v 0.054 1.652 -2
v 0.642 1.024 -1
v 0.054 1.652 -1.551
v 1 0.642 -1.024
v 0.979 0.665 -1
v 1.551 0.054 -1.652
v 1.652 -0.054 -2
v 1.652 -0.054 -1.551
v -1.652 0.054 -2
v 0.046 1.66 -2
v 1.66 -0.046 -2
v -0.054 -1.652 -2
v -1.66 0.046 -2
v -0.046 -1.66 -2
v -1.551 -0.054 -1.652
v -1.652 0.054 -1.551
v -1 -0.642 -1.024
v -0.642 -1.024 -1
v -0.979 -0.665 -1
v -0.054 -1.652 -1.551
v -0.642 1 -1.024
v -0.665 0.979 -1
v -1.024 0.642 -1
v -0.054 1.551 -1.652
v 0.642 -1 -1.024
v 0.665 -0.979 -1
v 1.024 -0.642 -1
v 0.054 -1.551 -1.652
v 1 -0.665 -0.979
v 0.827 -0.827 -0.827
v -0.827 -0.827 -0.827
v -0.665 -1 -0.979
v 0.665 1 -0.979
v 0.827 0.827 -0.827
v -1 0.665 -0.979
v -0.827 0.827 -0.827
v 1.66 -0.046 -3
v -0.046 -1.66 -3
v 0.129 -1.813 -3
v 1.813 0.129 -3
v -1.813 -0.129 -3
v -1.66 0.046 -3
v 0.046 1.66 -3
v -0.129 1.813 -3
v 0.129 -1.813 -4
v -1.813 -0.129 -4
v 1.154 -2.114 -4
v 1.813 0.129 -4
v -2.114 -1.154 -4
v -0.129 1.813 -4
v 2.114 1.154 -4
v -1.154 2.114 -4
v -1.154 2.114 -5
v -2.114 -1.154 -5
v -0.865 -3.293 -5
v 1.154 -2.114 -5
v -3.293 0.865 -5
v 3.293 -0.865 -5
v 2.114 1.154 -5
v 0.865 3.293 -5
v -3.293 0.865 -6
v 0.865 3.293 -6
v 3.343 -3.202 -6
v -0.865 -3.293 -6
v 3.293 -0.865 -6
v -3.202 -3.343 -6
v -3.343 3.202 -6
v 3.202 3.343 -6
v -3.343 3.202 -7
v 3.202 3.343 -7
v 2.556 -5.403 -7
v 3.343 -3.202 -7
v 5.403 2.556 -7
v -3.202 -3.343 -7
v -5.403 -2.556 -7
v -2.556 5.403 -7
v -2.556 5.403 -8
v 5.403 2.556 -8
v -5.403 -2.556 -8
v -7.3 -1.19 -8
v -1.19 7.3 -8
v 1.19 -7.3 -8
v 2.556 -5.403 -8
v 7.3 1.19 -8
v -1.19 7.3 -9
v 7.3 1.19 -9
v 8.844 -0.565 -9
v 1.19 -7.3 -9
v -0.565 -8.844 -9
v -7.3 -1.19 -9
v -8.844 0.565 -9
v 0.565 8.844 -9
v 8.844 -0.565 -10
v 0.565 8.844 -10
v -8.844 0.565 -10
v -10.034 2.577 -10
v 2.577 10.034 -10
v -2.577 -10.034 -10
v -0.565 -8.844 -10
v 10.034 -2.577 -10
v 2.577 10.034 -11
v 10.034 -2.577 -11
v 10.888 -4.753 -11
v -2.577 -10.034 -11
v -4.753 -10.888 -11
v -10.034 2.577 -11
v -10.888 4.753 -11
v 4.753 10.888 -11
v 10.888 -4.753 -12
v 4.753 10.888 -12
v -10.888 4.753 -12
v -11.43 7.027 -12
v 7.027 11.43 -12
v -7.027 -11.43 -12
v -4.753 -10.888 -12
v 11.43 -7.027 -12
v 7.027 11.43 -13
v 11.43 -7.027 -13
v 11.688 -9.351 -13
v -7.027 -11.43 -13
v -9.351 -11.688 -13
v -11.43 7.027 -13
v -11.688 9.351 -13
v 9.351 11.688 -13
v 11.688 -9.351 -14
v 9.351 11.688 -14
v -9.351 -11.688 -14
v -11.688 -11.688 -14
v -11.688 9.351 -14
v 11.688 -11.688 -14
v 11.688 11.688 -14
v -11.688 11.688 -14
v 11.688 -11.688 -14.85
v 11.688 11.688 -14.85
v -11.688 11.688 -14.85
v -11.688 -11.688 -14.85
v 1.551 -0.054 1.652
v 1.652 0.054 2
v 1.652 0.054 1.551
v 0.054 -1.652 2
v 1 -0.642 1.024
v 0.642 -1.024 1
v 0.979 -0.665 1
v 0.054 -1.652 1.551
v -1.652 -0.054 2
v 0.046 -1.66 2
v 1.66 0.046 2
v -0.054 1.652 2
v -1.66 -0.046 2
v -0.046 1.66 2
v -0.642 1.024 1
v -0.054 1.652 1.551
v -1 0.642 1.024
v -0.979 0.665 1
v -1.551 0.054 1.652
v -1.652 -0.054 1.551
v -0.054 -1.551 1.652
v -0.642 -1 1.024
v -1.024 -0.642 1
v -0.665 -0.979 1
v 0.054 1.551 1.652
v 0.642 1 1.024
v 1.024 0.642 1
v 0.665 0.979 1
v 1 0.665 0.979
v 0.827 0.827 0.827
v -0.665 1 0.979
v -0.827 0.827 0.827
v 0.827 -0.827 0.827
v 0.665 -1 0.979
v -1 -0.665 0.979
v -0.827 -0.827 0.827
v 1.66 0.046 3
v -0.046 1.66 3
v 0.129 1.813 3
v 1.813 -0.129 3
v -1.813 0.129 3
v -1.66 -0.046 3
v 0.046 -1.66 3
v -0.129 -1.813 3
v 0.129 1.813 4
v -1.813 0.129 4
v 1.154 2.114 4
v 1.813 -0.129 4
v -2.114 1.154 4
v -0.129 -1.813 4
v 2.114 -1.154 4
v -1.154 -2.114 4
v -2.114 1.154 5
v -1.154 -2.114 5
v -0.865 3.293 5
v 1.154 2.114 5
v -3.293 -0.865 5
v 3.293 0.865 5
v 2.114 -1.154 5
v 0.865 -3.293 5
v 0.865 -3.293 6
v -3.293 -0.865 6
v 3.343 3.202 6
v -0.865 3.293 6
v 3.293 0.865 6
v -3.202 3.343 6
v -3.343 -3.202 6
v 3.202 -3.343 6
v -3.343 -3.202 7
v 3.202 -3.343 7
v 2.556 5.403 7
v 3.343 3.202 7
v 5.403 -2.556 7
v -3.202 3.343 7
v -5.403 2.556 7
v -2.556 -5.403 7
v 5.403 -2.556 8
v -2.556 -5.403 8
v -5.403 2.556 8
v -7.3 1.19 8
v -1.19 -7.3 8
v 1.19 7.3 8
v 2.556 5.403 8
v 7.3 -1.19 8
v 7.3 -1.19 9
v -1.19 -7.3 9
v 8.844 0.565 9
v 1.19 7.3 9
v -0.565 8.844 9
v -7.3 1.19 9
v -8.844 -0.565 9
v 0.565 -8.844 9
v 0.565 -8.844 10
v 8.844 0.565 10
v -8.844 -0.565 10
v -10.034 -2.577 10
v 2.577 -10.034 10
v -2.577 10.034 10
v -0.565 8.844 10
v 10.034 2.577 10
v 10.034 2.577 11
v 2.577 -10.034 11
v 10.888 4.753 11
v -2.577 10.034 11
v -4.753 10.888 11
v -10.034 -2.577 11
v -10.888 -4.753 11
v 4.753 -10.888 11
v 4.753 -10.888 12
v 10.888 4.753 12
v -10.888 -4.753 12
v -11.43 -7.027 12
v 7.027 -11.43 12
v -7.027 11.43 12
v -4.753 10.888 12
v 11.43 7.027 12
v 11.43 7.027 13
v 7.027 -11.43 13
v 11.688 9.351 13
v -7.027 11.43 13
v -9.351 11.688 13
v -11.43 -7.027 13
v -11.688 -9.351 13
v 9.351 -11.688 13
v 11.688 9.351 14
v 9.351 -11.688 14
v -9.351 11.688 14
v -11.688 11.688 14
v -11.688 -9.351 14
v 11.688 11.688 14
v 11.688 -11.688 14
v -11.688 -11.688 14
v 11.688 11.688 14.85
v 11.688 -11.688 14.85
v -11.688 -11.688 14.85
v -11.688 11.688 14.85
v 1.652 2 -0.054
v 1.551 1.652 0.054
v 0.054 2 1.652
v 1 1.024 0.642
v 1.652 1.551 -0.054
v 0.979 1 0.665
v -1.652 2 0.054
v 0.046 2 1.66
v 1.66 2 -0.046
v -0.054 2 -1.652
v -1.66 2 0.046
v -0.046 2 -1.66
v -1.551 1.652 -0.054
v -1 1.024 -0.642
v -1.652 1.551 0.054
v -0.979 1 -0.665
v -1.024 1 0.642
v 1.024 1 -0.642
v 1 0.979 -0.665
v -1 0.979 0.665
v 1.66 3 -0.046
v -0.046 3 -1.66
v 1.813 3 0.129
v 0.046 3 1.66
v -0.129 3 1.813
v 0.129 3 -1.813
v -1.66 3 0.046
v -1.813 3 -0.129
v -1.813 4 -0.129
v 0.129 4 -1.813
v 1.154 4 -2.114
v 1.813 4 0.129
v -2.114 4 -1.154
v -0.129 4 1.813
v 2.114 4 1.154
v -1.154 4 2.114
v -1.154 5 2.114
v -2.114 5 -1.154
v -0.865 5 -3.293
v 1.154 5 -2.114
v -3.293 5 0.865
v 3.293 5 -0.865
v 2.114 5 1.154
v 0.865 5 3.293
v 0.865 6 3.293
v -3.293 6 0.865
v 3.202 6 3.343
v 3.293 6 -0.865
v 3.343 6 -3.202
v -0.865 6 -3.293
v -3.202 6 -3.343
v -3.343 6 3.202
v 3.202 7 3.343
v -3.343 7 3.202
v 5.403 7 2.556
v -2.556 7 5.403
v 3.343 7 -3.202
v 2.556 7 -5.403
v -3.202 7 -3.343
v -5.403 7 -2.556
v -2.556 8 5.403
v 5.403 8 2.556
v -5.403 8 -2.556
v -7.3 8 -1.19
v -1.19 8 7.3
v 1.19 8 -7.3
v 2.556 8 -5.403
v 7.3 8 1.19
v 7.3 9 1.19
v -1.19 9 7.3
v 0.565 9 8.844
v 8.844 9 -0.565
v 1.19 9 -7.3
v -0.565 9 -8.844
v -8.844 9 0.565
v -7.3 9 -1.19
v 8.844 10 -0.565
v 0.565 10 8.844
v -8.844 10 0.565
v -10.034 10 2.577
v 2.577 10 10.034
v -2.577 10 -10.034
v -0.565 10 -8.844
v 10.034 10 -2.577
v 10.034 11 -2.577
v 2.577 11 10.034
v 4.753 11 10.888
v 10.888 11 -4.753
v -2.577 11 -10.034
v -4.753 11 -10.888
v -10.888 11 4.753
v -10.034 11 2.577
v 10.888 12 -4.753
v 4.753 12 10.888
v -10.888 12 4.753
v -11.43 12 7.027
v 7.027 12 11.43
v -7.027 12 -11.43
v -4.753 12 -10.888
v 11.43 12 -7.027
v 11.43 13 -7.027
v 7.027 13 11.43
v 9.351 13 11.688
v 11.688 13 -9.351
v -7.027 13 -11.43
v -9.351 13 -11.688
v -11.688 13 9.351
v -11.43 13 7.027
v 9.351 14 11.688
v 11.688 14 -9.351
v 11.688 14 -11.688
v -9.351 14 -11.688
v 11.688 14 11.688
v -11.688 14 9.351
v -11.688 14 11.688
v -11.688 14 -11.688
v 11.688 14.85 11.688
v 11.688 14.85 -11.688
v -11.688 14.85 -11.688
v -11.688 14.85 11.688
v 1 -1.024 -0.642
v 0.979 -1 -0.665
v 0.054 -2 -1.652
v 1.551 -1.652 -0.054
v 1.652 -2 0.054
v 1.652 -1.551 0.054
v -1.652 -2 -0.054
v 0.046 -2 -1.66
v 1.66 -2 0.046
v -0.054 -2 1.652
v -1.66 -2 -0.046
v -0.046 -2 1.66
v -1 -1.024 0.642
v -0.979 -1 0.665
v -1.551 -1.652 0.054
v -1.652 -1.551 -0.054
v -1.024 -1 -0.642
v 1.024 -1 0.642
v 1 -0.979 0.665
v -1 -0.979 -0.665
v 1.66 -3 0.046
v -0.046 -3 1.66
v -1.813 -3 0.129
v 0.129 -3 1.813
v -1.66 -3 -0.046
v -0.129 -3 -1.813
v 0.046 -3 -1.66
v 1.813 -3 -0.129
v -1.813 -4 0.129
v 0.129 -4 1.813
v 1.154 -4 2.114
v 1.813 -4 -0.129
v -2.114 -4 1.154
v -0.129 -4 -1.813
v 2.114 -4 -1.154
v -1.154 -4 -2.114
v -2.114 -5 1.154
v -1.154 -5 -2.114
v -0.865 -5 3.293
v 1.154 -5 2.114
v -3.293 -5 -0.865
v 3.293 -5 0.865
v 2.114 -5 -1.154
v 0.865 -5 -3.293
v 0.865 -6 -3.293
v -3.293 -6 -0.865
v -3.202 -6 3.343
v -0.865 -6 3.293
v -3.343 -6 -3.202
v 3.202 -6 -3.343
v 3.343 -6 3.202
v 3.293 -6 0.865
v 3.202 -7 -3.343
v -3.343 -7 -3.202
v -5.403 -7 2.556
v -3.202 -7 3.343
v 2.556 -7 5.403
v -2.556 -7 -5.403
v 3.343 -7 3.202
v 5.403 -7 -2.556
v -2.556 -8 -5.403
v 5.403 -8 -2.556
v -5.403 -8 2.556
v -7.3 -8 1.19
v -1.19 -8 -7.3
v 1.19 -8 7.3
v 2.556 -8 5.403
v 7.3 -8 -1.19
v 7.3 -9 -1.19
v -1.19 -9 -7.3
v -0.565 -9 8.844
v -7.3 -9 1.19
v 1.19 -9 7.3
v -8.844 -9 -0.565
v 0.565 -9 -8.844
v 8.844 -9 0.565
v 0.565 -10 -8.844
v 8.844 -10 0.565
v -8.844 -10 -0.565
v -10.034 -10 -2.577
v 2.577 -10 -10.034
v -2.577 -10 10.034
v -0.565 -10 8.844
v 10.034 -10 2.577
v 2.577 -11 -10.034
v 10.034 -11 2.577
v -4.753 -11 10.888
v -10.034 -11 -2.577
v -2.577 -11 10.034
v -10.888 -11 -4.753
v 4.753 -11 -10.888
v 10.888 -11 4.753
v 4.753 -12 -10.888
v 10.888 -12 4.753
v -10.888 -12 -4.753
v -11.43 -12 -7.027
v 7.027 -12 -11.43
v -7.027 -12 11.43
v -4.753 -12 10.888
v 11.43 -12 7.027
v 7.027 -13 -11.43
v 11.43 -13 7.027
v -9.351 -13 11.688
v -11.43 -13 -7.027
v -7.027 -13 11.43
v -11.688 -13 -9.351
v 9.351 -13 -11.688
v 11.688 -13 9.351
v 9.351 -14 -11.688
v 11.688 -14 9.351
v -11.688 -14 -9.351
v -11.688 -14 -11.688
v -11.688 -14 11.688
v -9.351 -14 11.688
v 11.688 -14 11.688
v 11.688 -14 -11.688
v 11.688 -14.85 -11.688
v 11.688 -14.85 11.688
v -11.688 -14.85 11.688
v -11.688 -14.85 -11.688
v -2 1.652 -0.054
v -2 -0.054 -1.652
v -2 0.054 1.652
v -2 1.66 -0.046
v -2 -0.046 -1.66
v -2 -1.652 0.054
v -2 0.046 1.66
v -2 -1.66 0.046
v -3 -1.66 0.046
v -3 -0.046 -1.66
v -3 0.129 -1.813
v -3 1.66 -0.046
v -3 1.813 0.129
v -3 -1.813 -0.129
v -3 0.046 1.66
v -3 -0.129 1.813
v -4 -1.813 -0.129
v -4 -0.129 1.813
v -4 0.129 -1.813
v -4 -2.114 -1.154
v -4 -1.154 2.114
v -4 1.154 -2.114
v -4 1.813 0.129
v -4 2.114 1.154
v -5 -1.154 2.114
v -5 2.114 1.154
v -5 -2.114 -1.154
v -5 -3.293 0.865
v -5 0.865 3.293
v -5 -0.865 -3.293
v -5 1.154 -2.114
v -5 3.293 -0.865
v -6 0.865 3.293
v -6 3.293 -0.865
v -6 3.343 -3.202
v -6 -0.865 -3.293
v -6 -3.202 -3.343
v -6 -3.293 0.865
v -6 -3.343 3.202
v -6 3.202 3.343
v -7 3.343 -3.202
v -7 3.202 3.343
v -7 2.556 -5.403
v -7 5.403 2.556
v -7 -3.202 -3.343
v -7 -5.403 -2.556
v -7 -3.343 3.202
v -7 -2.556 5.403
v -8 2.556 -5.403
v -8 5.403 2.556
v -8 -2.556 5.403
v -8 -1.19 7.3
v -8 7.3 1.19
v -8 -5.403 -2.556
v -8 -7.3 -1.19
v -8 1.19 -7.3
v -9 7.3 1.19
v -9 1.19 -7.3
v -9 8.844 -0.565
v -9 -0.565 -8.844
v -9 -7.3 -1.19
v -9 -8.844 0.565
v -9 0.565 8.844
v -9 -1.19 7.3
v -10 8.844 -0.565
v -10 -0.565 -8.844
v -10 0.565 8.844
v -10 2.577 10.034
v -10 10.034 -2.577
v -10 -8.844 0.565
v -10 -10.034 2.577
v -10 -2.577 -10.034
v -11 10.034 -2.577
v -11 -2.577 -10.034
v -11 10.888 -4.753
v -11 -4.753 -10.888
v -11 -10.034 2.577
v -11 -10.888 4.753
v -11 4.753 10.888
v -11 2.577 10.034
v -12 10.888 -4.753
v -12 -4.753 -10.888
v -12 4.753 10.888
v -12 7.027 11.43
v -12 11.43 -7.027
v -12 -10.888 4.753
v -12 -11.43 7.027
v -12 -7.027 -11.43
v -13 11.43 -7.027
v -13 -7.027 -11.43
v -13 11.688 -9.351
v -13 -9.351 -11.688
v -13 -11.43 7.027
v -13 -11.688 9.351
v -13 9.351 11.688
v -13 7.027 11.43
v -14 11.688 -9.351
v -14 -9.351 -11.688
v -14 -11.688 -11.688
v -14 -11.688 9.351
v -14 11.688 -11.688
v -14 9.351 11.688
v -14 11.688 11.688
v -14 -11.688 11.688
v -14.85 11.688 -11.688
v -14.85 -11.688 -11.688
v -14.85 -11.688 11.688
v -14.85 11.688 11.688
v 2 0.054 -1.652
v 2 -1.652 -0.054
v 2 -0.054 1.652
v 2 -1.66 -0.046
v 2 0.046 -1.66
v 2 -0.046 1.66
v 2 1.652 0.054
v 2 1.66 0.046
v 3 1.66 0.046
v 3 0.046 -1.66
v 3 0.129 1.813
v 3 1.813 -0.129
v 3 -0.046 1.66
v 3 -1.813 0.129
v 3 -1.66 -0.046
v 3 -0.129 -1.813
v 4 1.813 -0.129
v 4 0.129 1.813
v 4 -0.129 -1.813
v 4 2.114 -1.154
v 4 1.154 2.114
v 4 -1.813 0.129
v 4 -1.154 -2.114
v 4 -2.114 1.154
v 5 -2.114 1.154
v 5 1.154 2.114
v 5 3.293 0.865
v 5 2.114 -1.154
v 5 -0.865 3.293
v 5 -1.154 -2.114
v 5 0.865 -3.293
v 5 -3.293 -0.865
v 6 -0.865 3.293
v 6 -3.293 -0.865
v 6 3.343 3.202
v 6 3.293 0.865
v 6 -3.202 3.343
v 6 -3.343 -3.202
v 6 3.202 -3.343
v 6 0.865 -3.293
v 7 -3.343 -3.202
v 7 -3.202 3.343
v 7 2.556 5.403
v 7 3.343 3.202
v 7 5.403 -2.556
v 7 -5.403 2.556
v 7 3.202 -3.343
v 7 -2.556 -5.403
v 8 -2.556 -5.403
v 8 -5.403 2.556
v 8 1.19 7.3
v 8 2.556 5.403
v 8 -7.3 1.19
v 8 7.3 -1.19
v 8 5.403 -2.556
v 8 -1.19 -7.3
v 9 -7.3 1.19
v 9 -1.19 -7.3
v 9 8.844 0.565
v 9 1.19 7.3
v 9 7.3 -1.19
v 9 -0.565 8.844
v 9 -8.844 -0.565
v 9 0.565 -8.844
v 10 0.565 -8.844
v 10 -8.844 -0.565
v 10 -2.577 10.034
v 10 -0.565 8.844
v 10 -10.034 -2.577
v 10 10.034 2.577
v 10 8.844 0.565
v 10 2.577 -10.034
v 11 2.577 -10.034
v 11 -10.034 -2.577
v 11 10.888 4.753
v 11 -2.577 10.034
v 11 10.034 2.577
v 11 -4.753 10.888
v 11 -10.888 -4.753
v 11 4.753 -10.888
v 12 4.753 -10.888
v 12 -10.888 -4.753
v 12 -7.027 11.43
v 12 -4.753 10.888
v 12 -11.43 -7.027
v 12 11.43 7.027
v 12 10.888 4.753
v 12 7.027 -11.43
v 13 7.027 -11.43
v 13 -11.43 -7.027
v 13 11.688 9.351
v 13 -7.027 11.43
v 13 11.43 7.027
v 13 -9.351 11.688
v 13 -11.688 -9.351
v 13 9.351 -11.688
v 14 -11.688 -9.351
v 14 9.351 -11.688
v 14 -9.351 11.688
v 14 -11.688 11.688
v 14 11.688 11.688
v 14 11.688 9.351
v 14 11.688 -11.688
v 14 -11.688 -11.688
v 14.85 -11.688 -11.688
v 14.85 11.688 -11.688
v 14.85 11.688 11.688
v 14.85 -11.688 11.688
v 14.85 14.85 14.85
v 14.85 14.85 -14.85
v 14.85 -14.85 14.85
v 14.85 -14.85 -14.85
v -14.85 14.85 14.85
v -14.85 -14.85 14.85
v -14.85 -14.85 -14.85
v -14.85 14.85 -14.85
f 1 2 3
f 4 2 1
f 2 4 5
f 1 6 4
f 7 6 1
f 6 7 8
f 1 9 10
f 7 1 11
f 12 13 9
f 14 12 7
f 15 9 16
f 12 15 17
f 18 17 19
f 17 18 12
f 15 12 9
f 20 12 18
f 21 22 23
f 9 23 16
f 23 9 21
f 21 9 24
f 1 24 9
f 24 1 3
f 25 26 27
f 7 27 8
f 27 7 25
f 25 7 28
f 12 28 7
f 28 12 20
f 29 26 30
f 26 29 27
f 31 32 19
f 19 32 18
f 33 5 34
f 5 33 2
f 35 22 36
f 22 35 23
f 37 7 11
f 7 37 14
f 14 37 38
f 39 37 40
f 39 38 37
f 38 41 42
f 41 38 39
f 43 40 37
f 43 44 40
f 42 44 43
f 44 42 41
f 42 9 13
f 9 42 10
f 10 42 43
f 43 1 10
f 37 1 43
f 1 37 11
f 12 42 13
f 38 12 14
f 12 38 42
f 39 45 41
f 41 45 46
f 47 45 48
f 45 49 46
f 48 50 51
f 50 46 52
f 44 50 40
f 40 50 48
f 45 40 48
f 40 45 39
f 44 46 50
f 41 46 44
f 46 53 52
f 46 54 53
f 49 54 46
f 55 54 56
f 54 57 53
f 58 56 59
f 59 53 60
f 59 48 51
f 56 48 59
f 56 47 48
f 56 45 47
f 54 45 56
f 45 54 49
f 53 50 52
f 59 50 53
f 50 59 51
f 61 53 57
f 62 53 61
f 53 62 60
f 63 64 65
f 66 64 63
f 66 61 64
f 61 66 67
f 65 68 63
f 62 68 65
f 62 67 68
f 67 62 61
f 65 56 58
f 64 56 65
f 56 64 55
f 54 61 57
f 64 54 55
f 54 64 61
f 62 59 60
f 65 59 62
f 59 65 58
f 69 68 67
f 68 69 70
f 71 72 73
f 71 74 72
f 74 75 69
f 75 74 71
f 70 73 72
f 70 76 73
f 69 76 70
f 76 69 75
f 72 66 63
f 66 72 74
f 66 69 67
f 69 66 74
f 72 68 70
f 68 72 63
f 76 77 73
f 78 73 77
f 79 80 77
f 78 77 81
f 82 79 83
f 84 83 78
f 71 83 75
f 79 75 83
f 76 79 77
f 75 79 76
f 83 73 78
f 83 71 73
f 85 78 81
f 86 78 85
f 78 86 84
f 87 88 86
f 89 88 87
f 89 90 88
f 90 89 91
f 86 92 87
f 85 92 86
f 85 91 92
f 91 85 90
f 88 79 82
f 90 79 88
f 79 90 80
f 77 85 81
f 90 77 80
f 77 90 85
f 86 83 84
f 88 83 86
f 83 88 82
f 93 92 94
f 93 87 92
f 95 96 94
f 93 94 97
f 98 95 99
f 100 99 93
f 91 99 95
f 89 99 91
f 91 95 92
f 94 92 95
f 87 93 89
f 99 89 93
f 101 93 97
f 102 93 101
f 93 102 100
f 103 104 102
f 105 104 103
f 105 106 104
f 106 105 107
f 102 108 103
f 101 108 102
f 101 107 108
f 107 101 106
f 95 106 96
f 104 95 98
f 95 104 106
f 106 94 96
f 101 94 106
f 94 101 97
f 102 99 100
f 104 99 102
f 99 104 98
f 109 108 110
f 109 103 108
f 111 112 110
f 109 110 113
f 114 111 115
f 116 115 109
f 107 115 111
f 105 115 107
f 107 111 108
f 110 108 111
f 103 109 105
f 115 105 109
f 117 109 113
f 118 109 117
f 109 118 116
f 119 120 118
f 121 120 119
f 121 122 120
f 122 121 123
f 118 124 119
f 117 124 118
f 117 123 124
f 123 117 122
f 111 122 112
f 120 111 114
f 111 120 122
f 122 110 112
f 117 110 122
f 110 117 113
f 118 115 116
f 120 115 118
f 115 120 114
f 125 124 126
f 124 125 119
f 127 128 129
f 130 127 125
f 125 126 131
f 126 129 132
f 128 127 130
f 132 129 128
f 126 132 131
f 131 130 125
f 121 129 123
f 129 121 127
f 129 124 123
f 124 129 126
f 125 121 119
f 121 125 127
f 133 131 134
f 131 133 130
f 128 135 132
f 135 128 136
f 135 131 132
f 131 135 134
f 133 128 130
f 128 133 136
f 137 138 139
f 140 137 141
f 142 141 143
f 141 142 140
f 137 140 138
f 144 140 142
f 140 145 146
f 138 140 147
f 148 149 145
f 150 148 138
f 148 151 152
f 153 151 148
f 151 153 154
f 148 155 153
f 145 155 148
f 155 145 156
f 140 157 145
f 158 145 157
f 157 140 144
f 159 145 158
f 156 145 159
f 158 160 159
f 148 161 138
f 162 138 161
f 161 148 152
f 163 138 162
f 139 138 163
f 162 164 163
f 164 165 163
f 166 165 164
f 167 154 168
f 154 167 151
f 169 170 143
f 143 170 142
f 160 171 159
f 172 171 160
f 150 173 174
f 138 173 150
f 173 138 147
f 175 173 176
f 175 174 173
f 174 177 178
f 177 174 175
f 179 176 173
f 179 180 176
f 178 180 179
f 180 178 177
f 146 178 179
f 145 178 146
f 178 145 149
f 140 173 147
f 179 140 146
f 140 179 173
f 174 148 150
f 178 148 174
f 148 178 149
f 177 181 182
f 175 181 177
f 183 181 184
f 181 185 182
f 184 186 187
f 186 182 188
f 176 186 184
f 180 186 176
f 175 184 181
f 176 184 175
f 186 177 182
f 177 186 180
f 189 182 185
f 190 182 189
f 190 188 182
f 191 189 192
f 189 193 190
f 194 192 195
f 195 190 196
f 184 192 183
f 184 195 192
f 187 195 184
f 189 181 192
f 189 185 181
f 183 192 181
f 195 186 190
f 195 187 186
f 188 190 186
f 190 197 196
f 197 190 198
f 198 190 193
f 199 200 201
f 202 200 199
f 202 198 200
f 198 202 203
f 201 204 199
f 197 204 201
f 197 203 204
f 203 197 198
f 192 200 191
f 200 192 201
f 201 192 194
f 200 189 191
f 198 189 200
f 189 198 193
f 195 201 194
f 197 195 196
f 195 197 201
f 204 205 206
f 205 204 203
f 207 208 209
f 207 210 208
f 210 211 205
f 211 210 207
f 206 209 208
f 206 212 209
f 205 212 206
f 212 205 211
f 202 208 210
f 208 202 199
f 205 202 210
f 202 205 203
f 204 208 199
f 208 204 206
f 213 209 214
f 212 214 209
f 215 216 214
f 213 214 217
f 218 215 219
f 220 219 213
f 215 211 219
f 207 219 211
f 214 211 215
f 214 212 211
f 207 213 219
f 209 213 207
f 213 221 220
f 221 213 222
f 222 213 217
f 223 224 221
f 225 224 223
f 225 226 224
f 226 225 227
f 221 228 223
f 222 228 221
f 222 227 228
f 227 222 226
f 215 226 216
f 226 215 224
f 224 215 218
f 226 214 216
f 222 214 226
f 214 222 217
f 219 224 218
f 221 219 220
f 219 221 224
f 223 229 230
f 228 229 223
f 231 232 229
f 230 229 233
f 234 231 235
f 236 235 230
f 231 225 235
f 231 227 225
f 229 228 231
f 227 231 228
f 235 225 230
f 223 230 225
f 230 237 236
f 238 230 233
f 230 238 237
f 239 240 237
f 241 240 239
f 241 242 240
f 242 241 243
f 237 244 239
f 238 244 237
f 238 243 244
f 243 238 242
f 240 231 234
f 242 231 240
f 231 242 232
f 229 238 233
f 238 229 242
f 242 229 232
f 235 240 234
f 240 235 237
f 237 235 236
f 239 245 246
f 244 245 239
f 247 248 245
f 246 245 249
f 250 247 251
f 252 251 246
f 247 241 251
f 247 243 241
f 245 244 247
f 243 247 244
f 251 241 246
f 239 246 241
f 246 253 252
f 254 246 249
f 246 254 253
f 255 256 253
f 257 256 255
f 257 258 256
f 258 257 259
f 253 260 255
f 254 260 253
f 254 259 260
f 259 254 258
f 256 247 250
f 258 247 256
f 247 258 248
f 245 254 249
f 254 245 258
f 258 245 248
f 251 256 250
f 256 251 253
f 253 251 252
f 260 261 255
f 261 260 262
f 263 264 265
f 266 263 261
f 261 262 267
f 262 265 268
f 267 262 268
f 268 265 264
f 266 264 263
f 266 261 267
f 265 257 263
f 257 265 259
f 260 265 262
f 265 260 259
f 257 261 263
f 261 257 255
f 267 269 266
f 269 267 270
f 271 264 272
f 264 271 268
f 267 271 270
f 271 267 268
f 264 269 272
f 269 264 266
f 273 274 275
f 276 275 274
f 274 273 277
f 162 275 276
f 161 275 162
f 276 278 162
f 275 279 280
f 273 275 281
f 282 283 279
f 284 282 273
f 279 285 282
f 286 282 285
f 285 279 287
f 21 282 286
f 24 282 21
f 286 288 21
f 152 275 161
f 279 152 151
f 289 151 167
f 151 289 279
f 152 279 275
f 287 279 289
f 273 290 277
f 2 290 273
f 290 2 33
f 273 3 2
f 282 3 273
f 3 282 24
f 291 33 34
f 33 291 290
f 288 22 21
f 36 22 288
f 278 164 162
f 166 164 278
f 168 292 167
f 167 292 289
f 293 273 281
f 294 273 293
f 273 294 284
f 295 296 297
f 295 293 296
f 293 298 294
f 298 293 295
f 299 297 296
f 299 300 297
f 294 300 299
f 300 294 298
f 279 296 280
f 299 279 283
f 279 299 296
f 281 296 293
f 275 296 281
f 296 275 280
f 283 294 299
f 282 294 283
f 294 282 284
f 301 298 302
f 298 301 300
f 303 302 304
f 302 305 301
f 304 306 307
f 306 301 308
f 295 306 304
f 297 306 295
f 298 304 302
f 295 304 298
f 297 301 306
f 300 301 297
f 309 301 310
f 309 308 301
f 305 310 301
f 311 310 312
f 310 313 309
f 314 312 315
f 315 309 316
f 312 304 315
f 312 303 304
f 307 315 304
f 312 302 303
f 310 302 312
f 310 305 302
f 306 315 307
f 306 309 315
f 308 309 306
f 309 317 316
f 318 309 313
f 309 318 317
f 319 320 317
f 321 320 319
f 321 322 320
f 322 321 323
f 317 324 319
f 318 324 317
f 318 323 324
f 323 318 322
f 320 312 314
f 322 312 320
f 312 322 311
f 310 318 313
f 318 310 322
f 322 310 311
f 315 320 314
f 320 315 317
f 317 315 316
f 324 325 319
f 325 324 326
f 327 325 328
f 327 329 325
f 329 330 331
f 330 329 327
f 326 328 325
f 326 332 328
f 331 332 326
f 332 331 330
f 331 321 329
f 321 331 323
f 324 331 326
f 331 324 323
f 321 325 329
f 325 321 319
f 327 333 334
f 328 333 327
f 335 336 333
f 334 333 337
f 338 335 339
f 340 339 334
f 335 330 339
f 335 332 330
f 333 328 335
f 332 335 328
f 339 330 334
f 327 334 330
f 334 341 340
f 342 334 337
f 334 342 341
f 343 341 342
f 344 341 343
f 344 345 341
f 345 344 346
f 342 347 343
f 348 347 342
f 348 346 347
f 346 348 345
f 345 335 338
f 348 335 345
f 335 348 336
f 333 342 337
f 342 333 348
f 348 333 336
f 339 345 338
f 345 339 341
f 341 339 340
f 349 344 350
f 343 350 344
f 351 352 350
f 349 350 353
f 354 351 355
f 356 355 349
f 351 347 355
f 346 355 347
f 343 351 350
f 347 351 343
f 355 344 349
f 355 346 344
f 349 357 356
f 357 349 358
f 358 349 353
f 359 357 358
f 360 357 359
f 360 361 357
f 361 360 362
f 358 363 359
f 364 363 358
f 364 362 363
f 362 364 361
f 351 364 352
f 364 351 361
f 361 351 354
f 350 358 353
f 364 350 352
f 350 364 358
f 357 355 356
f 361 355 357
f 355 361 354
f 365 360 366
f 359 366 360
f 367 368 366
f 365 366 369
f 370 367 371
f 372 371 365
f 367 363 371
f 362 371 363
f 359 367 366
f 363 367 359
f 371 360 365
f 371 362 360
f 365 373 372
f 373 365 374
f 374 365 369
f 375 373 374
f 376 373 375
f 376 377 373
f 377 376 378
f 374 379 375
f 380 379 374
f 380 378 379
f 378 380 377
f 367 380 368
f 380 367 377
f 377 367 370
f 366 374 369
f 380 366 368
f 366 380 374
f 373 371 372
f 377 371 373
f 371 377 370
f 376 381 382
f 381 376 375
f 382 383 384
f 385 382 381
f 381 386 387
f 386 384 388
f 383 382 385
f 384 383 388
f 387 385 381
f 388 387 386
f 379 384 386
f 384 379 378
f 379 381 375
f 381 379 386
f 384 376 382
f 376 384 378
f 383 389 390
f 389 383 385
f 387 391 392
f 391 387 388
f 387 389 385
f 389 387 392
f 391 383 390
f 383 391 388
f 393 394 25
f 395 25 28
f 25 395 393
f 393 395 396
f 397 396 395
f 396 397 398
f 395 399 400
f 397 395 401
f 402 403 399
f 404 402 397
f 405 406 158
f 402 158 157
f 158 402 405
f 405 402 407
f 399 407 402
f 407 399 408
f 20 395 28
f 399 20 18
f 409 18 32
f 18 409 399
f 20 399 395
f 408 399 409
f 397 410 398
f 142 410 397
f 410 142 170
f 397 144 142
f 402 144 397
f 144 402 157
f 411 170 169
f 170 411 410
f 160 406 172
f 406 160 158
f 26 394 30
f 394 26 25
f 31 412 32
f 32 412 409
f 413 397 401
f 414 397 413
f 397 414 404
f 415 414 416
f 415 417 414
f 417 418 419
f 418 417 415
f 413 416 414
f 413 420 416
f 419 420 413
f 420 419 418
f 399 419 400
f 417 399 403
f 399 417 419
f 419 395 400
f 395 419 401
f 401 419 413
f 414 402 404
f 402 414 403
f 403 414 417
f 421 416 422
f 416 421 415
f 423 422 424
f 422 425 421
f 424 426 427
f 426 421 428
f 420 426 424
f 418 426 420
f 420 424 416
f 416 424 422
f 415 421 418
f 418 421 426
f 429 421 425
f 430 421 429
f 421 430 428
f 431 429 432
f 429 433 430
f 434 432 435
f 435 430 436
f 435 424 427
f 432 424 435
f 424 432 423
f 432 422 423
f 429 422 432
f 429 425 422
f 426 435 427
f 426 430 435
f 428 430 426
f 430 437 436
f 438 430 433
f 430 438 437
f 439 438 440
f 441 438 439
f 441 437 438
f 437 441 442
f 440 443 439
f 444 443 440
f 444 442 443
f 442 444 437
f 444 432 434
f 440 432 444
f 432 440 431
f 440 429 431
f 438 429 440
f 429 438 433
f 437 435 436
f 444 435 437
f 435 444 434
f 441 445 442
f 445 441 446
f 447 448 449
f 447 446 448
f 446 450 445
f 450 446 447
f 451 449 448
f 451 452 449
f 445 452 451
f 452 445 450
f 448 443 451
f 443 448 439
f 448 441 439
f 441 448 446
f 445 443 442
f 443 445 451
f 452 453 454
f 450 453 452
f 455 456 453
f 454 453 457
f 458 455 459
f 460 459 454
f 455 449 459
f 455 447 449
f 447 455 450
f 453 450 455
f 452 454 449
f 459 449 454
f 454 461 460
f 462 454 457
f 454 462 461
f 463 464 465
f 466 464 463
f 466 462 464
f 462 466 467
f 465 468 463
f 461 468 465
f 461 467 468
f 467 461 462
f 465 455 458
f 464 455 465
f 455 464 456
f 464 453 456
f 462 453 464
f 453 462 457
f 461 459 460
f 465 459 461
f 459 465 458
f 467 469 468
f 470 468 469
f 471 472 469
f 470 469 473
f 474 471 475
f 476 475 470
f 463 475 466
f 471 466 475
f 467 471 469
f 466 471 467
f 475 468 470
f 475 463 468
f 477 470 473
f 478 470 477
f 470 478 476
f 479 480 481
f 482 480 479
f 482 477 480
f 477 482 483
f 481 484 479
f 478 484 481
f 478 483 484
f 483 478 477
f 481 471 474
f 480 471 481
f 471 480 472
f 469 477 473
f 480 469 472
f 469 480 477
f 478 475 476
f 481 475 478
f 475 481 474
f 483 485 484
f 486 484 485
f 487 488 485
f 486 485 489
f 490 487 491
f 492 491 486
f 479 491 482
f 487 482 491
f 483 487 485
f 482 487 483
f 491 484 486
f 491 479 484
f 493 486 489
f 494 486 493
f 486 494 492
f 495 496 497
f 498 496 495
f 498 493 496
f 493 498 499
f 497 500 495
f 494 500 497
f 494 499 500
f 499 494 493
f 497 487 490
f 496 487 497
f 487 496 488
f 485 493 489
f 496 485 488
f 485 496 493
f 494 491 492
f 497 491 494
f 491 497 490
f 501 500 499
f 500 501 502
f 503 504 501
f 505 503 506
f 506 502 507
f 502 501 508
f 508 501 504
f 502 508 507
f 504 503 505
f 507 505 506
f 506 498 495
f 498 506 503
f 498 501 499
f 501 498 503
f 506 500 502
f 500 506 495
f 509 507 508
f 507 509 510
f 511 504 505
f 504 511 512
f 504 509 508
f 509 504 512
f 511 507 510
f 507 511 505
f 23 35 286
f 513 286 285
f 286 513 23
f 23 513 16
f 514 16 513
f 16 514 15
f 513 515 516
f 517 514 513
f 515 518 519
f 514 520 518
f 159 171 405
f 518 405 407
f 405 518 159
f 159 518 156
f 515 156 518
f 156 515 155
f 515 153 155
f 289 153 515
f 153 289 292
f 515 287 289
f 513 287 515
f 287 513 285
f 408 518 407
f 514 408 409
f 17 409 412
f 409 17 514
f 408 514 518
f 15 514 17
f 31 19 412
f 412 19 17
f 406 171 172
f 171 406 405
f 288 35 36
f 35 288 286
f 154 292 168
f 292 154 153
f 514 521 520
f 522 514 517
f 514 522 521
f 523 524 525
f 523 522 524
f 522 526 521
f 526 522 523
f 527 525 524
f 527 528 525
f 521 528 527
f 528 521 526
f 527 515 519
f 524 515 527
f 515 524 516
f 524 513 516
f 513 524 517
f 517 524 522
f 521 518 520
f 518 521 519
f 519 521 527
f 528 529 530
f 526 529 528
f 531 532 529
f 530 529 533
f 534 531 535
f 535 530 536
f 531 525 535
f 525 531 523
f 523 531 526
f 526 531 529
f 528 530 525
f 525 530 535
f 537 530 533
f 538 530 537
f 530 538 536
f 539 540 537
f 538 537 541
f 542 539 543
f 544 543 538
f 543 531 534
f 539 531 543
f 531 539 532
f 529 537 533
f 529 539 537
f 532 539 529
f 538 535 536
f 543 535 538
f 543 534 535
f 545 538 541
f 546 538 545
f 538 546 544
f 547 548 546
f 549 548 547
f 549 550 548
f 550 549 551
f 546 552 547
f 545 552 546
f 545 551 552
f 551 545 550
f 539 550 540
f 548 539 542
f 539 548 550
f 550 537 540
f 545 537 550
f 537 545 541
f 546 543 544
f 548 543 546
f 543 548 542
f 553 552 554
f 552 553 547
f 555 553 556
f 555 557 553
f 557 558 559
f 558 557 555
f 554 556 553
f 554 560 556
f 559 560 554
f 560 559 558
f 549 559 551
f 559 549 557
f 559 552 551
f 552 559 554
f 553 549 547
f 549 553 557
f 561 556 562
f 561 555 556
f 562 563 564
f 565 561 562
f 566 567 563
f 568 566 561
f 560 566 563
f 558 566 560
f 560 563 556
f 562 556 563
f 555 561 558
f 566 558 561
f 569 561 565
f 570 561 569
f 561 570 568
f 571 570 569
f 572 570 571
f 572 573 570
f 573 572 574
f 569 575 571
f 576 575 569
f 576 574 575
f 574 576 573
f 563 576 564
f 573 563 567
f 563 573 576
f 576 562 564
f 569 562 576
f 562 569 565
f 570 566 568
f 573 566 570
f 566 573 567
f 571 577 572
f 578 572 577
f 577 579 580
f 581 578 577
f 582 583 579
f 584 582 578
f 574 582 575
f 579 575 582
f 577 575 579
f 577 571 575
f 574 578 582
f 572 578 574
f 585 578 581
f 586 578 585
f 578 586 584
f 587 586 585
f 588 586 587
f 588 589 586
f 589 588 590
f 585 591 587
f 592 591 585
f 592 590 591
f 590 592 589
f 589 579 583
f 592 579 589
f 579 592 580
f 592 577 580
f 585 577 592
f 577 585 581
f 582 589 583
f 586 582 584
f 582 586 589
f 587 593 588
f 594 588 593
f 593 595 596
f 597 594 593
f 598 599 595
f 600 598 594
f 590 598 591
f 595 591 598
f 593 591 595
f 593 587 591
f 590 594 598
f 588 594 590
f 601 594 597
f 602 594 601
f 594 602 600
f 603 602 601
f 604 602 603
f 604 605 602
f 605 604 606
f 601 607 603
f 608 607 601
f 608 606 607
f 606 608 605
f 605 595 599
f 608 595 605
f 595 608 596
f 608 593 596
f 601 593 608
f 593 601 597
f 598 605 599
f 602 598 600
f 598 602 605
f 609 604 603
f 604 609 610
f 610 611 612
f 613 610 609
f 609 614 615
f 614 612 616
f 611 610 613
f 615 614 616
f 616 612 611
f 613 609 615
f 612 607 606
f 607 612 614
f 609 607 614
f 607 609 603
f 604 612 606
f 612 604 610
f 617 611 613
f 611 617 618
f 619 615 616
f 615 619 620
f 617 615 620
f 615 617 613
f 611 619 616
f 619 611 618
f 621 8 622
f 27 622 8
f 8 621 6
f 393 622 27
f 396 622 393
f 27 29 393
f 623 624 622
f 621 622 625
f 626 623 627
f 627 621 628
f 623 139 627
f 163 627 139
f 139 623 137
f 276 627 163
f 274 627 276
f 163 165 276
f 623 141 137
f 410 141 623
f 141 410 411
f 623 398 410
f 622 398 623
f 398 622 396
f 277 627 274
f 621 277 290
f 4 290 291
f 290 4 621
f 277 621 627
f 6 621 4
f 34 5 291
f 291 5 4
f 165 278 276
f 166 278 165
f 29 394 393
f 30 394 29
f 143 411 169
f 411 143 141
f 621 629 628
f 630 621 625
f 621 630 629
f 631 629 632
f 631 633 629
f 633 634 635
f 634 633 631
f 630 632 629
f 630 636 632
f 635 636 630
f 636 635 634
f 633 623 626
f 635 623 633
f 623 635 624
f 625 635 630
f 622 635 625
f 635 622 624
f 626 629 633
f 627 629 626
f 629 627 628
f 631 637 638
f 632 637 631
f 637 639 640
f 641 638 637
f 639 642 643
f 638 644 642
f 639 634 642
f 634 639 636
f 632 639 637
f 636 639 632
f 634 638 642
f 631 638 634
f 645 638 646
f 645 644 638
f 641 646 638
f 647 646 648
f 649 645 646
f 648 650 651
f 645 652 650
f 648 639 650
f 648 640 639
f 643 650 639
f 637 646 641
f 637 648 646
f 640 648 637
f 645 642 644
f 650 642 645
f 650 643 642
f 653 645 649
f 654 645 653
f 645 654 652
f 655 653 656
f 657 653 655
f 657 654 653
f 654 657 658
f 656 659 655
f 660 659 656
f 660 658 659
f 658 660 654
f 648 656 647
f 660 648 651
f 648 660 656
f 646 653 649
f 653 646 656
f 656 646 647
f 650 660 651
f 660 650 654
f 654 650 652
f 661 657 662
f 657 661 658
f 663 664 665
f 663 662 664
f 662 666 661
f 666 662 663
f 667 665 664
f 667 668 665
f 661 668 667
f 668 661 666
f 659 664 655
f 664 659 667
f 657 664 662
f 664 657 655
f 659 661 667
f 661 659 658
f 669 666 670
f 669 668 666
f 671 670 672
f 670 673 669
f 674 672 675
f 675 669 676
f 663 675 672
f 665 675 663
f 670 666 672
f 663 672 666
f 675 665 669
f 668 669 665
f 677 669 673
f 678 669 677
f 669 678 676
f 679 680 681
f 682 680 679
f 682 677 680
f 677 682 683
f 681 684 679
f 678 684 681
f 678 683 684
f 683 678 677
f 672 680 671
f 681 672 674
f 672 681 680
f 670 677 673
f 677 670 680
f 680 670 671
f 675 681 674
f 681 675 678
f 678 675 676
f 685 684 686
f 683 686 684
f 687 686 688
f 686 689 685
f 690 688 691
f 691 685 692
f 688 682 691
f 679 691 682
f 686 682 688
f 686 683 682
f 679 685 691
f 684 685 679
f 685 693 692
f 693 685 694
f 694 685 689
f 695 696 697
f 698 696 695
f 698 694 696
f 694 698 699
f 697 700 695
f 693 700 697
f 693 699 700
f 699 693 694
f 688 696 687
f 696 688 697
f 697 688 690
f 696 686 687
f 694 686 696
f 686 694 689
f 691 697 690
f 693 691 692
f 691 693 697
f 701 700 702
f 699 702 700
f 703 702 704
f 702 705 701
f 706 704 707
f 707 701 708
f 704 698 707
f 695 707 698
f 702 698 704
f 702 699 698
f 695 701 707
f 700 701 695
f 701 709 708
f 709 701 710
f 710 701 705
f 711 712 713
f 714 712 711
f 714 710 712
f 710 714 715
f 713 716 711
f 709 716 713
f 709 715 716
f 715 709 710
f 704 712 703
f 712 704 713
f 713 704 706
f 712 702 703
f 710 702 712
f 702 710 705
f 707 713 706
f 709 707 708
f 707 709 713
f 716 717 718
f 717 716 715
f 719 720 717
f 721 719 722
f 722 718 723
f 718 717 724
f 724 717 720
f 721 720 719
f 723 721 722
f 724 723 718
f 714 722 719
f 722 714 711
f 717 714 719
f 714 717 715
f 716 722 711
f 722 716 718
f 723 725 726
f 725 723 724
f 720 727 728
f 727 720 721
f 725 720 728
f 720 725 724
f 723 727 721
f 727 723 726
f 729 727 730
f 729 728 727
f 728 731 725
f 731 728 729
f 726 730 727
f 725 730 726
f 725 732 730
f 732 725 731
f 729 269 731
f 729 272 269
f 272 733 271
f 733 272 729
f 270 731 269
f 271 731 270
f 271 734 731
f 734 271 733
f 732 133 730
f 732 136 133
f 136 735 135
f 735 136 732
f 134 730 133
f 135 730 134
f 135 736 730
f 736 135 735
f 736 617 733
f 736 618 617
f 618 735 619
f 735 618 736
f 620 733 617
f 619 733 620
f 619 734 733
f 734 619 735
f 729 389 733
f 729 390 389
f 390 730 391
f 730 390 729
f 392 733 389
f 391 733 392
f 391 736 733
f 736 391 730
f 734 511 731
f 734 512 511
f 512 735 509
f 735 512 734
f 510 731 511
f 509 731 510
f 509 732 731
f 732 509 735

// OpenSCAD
leng = 30;
leng_diff = 3;
min_leng = 3;
model = "Cube"; // [Cube, Base, Both]

module spiral_stack(orig_leng, orig_height, current_leng, leng_diff, min_leng, angle_offset, pre_height = 0, i = 0) {
    if(current_leng > min_leng && current_leng - leng_diff > 0) {
        angle = atan2(leng_diff, current_leng - leng_diff);
        
        factor = current_leng / orig_leng;
        
        translate([0, 0, pre_height]) 
            scale([factor, factor, 1]) 
                children();
         
        next_square_leng = sqrt(pow(leng_diff, 2) + pow(current_leng - leng_diff, 2));
        
        height = orig_height + pre_height;
        
        rotate(angle + angle_offset)
            spiral_stack(
                orig_leng, 
                orig_height, 
                next_square_leng, 
                leng_diff, 
                min_leng,
                angle_offset,                
                height,
                i + 1
            ) children();
    } else {
       // for debugging
       //  echo(i);
       // echo(current_leng / orig_leng * orig_height / 2);
    }
}

module spiral_cube(leng, leng_diff, min_leng) {
    thickness = leng / 30;

    module spiral_squares() {
        translate([0, 0, -leng / 2]) 
            spiral_stack(leng + leng_diff * 2 + thickness * 2.5, thickness, leng, leng_diff, min_leng, 0)
                translate([0, 0, thickness / 2]) 
                    cube([leng , leng, thickness], center = true);
    }

    module pair_spiral_squares() {
        spiral_squares();
        //mirror([0, 0, 1])
        rotate([180, 0, 0])
            spiral_squares();
    }

    difference() {
        cube(leng * 0.99, center = true);
        
        pair_spiral_squares();
        rotate([90, 0, 0]) pair_spiral_squares();
        rotate([0, 90, 0]) pair_spiral_squares();
         
    }
}

module base(leng) {
    $fn = 50;
    r = leng / 3;
    difference() {
        difference() {
            sphere(r);
            translate([0, 0, -r]) 
                linear_extrude(r) 
                    square(r * 2, center = true);
        }
        translate([0, 0, leng * sqrt(3) / 2 + leng / 15]) 
            rotate([45, atan2(1, sqrt(2)), 0]) 
                cube(leng * 0.99, center = true);
    }
}

if(model == "Cube") {
    spiral_cube(leng, leng_diff, min_leng);
} else if(model == "Base") {
    base(leng);
} else {

    // Because of float precision problems, I roate the base instead of the cube.
    spiral_cube(leng, leng_diff, min_leng);
    rotate([-45, 0, 0]) 
        rotate([0, -atan2(1, sqrt(2)), 0]) 
            translate([0, 0, -leng * sqrt(3) / 2 - leng / 15]) 
                base(leng);
}
